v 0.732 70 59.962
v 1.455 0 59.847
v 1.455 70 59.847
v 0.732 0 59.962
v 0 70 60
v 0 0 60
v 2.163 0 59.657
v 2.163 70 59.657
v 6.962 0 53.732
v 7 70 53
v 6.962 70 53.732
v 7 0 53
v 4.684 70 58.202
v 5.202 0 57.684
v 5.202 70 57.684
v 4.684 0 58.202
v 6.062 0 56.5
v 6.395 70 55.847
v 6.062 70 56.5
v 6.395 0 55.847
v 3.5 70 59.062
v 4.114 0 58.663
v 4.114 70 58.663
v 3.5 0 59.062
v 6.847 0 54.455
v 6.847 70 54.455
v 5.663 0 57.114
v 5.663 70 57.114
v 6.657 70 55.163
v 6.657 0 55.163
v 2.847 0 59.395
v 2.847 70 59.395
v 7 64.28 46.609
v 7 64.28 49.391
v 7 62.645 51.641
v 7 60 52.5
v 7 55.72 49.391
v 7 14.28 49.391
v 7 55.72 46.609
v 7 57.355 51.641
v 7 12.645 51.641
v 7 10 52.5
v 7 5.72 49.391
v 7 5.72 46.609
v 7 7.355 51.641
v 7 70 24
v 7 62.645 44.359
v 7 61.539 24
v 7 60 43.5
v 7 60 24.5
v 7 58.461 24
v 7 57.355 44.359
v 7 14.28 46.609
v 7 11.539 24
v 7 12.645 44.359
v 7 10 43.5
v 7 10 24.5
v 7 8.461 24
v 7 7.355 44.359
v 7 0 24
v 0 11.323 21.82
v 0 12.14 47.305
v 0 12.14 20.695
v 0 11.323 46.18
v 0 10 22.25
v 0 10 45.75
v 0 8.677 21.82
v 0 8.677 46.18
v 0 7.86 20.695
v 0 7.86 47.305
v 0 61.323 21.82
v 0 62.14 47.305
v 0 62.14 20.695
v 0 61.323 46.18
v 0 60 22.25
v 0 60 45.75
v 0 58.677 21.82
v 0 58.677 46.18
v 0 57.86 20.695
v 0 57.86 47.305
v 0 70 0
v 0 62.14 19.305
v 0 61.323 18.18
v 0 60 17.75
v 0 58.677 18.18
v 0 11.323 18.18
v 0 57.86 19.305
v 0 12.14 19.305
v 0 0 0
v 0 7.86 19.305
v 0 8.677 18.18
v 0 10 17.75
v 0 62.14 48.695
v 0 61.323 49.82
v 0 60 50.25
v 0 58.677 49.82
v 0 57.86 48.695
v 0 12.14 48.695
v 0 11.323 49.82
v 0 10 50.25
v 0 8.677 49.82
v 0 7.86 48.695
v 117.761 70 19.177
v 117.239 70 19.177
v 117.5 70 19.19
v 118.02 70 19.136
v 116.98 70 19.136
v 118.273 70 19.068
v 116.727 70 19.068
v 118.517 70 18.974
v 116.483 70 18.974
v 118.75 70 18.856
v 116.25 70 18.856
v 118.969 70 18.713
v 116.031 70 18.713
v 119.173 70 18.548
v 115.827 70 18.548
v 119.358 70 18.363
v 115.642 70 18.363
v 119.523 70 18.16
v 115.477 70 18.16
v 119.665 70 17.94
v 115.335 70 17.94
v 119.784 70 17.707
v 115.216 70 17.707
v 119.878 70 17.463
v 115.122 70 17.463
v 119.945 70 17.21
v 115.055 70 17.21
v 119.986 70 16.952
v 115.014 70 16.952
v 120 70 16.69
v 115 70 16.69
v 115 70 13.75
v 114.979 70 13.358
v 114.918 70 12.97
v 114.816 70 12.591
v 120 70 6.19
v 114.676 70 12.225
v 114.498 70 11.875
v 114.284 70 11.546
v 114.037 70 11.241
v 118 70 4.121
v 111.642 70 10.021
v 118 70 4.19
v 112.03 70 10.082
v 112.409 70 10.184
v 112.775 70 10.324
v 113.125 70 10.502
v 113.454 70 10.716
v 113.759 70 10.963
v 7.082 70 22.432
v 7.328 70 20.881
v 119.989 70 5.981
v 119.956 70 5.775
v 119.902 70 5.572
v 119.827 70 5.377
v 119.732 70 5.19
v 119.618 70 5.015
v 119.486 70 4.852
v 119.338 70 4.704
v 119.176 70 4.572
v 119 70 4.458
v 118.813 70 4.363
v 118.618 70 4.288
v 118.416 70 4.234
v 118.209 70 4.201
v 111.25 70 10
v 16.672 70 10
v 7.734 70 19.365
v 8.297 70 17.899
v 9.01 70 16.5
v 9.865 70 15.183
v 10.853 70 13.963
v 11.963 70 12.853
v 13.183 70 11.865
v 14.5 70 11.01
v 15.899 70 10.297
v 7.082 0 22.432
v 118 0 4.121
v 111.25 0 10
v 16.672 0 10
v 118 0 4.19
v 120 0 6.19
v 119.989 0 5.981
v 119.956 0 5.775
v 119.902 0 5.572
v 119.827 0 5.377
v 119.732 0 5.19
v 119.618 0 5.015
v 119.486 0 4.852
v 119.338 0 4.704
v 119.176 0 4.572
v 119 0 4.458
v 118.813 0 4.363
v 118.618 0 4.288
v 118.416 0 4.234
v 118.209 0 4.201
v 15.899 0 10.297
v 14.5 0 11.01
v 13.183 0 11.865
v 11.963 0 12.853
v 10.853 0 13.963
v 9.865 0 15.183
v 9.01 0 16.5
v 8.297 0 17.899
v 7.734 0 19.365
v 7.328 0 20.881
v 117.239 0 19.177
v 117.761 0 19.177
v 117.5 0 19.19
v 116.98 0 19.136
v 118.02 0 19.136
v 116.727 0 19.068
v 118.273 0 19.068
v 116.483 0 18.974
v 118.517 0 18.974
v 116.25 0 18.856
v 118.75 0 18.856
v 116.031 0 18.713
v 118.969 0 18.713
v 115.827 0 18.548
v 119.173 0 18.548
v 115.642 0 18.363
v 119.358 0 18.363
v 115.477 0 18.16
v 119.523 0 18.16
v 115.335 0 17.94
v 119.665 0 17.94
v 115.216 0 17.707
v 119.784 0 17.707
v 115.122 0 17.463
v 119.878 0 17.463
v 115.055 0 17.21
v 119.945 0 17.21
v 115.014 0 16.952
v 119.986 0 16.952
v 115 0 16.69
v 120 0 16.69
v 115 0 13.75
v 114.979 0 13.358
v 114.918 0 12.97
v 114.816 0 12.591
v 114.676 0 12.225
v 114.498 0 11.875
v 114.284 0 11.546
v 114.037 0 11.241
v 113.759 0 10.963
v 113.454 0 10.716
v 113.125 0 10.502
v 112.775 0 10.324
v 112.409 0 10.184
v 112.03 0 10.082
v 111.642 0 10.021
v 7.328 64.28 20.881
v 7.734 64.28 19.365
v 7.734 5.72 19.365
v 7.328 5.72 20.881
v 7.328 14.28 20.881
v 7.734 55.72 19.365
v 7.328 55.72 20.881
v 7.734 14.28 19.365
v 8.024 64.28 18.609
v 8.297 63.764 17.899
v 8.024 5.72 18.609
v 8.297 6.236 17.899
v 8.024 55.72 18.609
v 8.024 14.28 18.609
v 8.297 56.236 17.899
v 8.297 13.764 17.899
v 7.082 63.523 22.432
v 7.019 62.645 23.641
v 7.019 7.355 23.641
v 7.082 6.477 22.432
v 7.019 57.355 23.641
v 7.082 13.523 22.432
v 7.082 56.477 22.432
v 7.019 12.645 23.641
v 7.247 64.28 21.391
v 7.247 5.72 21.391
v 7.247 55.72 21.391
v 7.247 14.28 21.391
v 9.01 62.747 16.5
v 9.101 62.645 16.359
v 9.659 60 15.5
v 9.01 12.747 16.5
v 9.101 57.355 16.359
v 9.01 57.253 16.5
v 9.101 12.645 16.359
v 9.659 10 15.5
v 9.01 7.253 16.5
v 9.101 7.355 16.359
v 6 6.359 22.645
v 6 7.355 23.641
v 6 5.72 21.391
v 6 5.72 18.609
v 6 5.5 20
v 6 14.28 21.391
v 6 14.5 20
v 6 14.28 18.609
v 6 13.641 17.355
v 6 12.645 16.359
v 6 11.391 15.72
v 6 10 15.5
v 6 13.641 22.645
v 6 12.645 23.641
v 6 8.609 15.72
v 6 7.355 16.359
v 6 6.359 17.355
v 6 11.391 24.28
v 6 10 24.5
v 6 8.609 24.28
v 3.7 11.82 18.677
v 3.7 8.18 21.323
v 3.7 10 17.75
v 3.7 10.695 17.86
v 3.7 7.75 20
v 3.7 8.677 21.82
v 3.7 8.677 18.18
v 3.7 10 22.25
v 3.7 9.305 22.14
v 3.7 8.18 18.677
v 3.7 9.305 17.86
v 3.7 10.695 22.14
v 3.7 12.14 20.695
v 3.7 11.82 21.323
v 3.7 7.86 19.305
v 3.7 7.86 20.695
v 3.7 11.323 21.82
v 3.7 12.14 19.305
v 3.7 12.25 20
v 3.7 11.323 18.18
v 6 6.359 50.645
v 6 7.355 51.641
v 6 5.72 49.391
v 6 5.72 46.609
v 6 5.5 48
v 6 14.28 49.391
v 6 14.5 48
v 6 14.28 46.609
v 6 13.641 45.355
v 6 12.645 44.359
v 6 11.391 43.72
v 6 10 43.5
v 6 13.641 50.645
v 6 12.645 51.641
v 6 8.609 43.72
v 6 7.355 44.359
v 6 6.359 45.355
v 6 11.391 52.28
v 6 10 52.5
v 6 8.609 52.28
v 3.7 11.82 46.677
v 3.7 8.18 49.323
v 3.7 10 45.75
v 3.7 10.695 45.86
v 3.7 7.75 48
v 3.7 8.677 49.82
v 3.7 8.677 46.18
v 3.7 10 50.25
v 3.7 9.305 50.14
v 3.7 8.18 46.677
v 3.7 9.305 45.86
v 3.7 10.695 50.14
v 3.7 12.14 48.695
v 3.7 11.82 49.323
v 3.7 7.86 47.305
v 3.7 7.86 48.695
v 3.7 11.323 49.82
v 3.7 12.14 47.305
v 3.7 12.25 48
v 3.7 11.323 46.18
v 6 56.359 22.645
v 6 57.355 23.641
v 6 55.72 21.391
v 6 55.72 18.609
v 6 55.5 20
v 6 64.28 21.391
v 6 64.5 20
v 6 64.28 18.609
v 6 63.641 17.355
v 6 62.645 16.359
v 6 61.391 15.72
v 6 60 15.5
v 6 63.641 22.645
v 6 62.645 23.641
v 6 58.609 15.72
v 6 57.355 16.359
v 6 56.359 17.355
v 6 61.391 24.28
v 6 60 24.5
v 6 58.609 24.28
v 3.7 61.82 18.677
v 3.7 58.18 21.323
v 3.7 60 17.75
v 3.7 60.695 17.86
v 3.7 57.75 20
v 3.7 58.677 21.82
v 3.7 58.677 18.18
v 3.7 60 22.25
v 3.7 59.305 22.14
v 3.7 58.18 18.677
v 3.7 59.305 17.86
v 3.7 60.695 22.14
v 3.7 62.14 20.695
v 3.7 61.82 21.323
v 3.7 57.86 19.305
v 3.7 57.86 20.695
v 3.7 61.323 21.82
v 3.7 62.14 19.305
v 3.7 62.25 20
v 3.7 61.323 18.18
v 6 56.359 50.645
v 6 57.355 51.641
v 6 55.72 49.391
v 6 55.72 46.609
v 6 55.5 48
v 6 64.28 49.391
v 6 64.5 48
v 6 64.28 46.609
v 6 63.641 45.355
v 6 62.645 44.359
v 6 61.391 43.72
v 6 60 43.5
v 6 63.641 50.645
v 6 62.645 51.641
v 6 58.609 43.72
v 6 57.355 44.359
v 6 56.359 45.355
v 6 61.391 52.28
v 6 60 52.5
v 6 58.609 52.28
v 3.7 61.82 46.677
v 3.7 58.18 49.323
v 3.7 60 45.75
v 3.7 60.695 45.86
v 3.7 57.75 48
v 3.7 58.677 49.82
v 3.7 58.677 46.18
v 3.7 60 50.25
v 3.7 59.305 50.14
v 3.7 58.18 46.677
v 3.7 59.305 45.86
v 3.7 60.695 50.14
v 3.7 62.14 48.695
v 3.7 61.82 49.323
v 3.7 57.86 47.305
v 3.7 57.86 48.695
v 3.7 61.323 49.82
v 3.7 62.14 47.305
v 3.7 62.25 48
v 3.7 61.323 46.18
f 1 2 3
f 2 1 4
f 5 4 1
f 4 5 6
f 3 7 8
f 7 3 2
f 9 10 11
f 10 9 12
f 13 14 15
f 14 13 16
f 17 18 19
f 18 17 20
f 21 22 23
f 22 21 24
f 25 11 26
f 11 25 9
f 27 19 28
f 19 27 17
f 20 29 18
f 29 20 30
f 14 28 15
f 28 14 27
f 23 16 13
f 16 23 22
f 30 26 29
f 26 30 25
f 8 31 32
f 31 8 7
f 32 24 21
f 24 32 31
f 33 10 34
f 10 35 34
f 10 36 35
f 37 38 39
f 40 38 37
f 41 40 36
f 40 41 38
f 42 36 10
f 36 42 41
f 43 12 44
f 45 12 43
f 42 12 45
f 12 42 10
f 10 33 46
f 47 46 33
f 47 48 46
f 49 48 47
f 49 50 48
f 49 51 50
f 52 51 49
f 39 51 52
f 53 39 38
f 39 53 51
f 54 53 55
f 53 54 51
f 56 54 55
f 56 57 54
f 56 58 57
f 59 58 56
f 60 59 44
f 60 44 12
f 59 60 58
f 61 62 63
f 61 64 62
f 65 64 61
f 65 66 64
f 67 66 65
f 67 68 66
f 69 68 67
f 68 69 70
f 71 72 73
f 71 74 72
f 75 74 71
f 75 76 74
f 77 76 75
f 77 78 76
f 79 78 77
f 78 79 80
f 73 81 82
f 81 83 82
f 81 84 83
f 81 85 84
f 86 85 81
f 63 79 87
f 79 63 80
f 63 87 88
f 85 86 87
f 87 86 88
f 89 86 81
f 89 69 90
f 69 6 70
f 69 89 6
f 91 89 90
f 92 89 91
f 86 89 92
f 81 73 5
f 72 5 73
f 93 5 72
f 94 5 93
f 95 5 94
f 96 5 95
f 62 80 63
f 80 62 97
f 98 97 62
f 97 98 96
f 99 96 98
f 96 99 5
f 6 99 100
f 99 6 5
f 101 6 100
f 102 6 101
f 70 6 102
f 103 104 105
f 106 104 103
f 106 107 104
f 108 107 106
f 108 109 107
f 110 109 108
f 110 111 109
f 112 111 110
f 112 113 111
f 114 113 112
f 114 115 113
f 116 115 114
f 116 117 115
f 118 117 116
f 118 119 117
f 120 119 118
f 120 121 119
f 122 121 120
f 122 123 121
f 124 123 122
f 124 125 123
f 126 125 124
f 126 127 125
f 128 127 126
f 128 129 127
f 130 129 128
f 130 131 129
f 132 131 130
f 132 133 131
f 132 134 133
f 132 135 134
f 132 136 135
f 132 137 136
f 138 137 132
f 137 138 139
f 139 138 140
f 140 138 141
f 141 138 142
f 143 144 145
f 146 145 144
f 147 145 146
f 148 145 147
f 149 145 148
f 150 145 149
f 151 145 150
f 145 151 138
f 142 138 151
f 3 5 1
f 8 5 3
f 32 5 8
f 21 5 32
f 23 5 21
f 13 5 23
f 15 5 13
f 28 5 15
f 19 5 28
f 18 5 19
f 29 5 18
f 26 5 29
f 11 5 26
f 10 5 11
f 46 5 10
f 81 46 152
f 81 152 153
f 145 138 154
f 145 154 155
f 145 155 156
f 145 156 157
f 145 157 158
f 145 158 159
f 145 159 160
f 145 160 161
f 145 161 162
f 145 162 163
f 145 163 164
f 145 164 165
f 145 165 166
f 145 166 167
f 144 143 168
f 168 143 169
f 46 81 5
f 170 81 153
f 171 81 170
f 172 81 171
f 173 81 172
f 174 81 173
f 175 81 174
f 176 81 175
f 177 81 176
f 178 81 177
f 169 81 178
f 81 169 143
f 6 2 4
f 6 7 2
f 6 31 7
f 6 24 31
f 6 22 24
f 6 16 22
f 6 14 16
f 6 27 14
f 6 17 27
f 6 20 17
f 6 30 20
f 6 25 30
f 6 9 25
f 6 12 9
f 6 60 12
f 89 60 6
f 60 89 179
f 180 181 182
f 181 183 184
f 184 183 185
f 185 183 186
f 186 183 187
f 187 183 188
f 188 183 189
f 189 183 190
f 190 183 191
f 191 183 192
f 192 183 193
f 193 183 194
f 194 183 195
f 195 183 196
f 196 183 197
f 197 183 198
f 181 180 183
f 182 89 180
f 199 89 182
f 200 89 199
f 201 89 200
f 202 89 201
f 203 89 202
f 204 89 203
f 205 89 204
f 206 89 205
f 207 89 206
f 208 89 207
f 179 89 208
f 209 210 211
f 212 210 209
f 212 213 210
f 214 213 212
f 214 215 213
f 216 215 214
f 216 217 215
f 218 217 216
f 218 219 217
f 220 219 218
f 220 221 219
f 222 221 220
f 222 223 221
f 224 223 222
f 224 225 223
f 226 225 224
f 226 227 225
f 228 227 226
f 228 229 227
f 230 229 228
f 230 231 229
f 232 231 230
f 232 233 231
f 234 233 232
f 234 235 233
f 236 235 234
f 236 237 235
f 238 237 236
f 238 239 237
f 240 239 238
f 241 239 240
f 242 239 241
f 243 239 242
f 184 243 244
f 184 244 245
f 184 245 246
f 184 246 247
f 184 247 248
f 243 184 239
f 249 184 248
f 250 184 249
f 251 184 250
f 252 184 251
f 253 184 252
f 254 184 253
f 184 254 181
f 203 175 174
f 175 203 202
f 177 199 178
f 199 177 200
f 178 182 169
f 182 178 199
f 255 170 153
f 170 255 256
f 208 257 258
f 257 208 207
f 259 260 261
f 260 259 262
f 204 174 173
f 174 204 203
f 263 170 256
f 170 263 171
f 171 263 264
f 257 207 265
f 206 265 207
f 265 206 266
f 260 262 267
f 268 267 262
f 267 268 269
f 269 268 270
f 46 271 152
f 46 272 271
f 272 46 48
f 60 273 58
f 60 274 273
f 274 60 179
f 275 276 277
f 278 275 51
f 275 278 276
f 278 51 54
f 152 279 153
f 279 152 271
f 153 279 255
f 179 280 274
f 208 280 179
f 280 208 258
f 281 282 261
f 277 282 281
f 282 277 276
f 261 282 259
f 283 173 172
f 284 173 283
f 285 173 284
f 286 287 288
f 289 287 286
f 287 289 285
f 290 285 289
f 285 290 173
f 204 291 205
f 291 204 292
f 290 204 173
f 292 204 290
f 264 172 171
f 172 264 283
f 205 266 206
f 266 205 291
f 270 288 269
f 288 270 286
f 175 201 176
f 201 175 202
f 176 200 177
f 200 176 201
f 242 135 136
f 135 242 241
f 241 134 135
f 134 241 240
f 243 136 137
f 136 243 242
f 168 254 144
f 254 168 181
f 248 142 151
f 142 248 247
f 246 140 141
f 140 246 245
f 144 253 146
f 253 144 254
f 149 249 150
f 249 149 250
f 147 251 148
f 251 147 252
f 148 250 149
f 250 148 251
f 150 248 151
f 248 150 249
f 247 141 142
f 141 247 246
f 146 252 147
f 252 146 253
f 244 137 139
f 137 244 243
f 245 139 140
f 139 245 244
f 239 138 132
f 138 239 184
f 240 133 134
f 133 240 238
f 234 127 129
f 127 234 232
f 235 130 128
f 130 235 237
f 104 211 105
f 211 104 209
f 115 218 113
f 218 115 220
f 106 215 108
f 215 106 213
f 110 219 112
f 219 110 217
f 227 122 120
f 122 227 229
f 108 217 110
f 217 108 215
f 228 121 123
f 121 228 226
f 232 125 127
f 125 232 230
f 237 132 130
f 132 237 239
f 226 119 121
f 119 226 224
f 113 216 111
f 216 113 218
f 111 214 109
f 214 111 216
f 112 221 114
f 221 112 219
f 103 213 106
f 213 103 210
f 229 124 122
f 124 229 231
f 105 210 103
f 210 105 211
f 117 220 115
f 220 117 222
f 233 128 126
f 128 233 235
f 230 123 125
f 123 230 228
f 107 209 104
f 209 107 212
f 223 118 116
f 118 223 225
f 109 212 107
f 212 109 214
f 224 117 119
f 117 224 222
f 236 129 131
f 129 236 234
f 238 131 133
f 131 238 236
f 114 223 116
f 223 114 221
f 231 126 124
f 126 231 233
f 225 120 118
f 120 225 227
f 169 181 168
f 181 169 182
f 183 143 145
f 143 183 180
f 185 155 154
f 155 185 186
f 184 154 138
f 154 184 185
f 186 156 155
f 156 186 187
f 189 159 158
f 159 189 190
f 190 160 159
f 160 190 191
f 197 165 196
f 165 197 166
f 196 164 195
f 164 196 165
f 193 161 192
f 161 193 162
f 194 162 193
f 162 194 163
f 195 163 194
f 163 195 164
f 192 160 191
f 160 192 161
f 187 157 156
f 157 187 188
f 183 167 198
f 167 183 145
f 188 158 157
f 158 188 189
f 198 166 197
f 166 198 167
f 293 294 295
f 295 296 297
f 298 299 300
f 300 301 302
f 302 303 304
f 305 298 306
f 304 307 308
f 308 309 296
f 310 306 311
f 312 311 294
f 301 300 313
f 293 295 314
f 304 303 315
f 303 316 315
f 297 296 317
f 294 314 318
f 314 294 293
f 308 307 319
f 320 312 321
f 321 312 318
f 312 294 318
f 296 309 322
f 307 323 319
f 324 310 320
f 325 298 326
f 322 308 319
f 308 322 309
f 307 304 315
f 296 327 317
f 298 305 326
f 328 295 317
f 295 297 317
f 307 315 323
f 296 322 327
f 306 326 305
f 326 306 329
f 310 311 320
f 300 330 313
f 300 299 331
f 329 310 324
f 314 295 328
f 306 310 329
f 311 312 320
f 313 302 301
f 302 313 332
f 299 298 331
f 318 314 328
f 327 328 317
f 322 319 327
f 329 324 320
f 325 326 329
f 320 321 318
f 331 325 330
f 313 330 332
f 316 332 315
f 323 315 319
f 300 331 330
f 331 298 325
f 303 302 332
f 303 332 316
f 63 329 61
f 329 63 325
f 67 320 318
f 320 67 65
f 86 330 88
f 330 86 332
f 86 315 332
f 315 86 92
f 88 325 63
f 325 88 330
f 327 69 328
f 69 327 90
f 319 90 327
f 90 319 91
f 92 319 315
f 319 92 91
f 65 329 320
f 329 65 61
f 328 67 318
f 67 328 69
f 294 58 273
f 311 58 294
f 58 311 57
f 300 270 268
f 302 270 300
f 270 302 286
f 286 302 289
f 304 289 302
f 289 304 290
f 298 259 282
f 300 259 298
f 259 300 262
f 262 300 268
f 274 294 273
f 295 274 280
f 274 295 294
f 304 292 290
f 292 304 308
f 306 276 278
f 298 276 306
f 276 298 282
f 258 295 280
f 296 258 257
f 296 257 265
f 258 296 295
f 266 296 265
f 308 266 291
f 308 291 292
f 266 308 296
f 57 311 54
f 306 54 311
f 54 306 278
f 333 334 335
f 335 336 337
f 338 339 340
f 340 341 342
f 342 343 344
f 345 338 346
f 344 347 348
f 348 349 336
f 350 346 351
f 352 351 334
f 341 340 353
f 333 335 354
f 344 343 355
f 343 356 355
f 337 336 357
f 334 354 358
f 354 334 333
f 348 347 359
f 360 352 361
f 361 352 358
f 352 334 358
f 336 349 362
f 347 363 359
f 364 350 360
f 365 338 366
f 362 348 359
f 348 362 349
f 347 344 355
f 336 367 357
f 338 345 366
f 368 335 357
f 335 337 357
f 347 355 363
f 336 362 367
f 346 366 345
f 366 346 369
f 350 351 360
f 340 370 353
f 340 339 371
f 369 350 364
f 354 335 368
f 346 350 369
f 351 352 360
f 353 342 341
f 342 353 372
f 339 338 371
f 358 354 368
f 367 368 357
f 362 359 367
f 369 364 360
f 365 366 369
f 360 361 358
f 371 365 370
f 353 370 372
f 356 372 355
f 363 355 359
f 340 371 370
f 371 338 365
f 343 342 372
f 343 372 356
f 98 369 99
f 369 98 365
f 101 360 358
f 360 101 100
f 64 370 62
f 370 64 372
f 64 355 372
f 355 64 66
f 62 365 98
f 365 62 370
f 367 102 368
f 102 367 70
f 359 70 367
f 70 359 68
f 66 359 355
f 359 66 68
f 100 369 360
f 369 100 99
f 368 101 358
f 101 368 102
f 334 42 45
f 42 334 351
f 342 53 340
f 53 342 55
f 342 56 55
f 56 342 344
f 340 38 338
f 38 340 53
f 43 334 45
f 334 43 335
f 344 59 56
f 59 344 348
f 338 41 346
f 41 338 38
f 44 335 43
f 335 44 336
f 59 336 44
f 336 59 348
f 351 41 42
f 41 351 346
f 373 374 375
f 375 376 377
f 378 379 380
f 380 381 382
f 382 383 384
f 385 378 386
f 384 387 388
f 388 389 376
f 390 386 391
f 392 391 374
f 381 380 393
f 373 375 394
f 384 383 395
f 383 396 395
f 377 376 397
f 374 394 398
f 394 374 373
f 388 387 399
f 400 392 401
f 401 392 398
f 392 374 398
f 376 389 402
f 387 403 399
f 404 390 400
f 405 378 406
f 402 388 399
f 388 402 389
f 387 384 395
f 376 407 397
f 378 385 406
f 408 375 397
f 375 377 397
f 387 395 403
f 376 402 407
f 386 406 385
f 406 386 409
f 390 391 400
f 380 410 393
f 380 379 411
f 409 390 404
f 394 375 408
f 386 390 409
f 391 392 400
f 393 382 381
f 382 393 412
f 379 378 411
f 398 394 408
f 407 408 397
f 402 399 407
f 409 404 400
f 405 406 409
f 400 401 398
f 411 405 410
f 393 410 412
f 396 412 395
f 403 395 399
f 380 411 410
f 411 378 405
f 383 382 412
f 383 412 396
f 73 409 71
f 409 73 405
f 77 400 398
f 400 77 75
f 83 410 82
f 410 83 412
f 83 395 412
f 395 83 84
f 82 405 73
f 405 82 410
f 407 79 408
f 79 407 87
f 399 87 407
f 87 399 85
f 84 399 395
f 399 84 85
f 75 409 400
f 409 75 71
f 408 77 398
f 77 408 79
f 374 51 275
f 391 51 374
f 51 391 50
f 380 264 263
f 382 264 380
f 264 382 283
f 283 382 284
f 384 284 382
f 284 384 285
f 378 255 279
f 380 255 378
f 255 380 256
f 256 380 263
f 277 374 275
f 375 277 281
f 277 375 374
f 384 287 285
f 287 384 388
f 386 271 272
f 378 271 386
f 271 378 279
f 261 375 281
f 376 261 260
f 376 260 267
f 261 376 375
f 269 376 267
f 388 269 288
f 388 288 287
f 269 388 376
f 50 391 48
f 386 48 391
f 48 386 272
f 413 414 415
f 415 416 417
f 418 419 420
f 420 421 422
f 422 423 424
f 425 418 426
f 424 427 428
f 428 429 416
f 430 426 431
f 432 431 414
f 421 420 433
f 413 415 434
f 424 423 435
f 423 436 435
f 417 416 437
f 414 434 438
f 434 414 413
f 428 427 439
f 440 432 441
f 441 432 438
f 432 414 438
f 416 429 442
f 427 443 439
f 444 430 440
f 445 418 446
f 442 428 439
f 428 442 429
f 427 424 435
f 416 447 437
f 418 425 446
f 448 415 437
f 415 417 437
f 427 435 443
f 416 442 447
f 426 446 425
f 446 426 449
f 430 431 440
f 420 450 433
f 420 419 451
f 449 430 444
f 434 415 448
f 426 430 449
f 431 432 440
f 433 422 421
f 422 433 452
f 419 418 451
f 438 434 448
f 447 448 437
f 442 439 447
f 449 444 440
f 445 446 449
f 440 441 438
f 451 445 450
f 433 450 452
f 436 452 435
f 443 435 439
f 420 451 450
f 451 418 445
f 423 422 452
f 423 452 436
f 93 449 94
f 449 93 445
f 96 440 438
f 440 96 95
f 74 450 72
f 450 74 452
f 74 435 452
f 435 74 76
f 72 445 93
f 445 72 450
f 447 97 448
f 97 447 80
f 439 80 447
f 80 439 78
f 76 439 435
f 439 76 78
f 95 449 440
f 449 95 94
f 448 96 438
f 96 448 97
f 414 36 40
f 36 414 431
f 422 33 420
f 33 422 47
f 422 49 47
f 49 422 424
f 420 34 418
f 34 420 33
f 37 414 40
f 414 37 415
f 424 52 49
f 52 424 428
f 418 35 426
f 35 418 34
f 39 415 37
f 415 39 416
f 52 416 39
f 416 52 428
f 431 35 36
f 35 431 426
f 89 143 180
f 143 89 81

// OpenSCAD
/*
 * Adjustible hook for haning things
 *
*/

hookWidth = 70;			//total width
armLength = 120;		//total lenght
armHeight = 10;			//how thick will the arm be at the thickes part
armTaper = 2;				//used to give gental taper to arm 2 is a good number
mountHeight = 60;		//height of the mounting portion
mountThick = 7;			//thickness of the mounting portion
quadScrew = true;	  //recommended over 40mm wide
supportSize = 15;		//rounded inner corner for structural support
endHeight = 15;			//height of the hook at the end
endWidth = 5;				//width of the hook at the end

//  Calculated fields
endStart = armLength-endWidth;		//used to set hook back
calcEndBottom = armLength * tan(armTaper);
echo(calcEndBottom);

//  Static variables
$fn = 60;

//  Begin object
difference(){
	union(){
		// Mount
		difference(){
			cube([mountThick,hookWidth,mountHeight]);
			translate([mountThick,0,mountHeight]) rotate([-90,90,0]) fillet(mountThick,hookWidth);  // rounded top
		}
		// Arm
		difference(){
			cube([armLength, hookWidth, armHeight]);
		}
		// Rounded structural support
		difference(){
			translate([mountThick,0,armHeight-1]) cube([supportSize,hookWidth,supportSize]);
			translate([mountThick+supportSize,-1,armHeight-1+supportSize]) rotate([-90,0,0]) cylinder(r=supportSize,h=hookWidth+2);
		}
		// Hook End
		union() {
			translate([endStart,0,calcEndBottom])cube([endWidth,hookWidth,endHeight-endWidth/2]);
			translate([endStart+armHeight/4,0,calcEndBottom+endHeight-endWidth/2]) rotate([-90,0,0]) cylinder(d=endWidth, h=hookWidth);
			translate([endStart,1,armHeight]) rotate([-90,180,0]) fillet(endHeight/4,hookWidth-2);
		}
	}
	// Remove bottom to taper angle
	translate([0,-1,0]) rotate([0,-armTaper,0]) mirror([0,0,1]) cube([armLength*1.25,hookWidth+2,armHeight*2]);
	// round front bottom edge
	translate([armLength,0,calcEndBottom]) rotate([-90,180,0]) fillet(2, hookWidth);
	// remove screw holes
	if(quadScrew){
		#translate([mountThick-1,+10,endHeight+5]) rotate([0,90,0]) screwHole();
		#translate([mountThick-1,+10,mountHeight-12]) rotate([0,90,0]) screwHole();
		#translate([mountThick-1,hookWidth-10,endHeight+5]) rotate([0,90,0]) screwHole();
		#translate([mountThick-1,hookWidth-10,mountHeight-12]) rotate([0,90,0]) screwHole();
	}else {
		#translate([mountThick-1,hookWidth/2,endHeight+10]) rotate([0,90,0]) screwHole();
		#translate([mountThick-1,hookWidth/2,mountHeight-10]) rotate([0,90,0]) screwHole();
	}
}

module screwHole(){
    screwHole = 4.5;
    screwDepth = 10;
    screwHead = 9;
    headTaper = 2.3;
    screwHeadDepth = 5;
    translate([0,0,-headTaper])cylinder(d1=screwHole, d2=screwHead, h = headTaper, $fn=20);
    translate([0,0,-headTaper-screwDepth])cylinder(d=screwHole, h=screwDepth, $fn=10);
    translate([0,0,-headTaper-screwDepth])cylinder(d=screwHole, h=screwDepth, $fn=10);
    translate([0,0,0]) cylinder(d=screwHead, h=screwHeadDepth, $fn=10);
}

module fillet(radius = 1, height = 1){
    translate([radius, radius, -1]) rotate([0,0,180])
        difference(){
            cube([radius + 1, radius + 1, height + 2]);
            translate([0,0,-1]) cylinder(r = radius, h = height + 4, $fn=60);
        }
}

module filletold(radius = 1, height = 1){
    translate([radius, radius, -1]) rotate([0,0,180])
        difference(){
            #cube([radius + 1, radius + 1, height + 2]);
            translate([0,0,-1]) cylinder(r = radius, h = height + 4);
        }
}
